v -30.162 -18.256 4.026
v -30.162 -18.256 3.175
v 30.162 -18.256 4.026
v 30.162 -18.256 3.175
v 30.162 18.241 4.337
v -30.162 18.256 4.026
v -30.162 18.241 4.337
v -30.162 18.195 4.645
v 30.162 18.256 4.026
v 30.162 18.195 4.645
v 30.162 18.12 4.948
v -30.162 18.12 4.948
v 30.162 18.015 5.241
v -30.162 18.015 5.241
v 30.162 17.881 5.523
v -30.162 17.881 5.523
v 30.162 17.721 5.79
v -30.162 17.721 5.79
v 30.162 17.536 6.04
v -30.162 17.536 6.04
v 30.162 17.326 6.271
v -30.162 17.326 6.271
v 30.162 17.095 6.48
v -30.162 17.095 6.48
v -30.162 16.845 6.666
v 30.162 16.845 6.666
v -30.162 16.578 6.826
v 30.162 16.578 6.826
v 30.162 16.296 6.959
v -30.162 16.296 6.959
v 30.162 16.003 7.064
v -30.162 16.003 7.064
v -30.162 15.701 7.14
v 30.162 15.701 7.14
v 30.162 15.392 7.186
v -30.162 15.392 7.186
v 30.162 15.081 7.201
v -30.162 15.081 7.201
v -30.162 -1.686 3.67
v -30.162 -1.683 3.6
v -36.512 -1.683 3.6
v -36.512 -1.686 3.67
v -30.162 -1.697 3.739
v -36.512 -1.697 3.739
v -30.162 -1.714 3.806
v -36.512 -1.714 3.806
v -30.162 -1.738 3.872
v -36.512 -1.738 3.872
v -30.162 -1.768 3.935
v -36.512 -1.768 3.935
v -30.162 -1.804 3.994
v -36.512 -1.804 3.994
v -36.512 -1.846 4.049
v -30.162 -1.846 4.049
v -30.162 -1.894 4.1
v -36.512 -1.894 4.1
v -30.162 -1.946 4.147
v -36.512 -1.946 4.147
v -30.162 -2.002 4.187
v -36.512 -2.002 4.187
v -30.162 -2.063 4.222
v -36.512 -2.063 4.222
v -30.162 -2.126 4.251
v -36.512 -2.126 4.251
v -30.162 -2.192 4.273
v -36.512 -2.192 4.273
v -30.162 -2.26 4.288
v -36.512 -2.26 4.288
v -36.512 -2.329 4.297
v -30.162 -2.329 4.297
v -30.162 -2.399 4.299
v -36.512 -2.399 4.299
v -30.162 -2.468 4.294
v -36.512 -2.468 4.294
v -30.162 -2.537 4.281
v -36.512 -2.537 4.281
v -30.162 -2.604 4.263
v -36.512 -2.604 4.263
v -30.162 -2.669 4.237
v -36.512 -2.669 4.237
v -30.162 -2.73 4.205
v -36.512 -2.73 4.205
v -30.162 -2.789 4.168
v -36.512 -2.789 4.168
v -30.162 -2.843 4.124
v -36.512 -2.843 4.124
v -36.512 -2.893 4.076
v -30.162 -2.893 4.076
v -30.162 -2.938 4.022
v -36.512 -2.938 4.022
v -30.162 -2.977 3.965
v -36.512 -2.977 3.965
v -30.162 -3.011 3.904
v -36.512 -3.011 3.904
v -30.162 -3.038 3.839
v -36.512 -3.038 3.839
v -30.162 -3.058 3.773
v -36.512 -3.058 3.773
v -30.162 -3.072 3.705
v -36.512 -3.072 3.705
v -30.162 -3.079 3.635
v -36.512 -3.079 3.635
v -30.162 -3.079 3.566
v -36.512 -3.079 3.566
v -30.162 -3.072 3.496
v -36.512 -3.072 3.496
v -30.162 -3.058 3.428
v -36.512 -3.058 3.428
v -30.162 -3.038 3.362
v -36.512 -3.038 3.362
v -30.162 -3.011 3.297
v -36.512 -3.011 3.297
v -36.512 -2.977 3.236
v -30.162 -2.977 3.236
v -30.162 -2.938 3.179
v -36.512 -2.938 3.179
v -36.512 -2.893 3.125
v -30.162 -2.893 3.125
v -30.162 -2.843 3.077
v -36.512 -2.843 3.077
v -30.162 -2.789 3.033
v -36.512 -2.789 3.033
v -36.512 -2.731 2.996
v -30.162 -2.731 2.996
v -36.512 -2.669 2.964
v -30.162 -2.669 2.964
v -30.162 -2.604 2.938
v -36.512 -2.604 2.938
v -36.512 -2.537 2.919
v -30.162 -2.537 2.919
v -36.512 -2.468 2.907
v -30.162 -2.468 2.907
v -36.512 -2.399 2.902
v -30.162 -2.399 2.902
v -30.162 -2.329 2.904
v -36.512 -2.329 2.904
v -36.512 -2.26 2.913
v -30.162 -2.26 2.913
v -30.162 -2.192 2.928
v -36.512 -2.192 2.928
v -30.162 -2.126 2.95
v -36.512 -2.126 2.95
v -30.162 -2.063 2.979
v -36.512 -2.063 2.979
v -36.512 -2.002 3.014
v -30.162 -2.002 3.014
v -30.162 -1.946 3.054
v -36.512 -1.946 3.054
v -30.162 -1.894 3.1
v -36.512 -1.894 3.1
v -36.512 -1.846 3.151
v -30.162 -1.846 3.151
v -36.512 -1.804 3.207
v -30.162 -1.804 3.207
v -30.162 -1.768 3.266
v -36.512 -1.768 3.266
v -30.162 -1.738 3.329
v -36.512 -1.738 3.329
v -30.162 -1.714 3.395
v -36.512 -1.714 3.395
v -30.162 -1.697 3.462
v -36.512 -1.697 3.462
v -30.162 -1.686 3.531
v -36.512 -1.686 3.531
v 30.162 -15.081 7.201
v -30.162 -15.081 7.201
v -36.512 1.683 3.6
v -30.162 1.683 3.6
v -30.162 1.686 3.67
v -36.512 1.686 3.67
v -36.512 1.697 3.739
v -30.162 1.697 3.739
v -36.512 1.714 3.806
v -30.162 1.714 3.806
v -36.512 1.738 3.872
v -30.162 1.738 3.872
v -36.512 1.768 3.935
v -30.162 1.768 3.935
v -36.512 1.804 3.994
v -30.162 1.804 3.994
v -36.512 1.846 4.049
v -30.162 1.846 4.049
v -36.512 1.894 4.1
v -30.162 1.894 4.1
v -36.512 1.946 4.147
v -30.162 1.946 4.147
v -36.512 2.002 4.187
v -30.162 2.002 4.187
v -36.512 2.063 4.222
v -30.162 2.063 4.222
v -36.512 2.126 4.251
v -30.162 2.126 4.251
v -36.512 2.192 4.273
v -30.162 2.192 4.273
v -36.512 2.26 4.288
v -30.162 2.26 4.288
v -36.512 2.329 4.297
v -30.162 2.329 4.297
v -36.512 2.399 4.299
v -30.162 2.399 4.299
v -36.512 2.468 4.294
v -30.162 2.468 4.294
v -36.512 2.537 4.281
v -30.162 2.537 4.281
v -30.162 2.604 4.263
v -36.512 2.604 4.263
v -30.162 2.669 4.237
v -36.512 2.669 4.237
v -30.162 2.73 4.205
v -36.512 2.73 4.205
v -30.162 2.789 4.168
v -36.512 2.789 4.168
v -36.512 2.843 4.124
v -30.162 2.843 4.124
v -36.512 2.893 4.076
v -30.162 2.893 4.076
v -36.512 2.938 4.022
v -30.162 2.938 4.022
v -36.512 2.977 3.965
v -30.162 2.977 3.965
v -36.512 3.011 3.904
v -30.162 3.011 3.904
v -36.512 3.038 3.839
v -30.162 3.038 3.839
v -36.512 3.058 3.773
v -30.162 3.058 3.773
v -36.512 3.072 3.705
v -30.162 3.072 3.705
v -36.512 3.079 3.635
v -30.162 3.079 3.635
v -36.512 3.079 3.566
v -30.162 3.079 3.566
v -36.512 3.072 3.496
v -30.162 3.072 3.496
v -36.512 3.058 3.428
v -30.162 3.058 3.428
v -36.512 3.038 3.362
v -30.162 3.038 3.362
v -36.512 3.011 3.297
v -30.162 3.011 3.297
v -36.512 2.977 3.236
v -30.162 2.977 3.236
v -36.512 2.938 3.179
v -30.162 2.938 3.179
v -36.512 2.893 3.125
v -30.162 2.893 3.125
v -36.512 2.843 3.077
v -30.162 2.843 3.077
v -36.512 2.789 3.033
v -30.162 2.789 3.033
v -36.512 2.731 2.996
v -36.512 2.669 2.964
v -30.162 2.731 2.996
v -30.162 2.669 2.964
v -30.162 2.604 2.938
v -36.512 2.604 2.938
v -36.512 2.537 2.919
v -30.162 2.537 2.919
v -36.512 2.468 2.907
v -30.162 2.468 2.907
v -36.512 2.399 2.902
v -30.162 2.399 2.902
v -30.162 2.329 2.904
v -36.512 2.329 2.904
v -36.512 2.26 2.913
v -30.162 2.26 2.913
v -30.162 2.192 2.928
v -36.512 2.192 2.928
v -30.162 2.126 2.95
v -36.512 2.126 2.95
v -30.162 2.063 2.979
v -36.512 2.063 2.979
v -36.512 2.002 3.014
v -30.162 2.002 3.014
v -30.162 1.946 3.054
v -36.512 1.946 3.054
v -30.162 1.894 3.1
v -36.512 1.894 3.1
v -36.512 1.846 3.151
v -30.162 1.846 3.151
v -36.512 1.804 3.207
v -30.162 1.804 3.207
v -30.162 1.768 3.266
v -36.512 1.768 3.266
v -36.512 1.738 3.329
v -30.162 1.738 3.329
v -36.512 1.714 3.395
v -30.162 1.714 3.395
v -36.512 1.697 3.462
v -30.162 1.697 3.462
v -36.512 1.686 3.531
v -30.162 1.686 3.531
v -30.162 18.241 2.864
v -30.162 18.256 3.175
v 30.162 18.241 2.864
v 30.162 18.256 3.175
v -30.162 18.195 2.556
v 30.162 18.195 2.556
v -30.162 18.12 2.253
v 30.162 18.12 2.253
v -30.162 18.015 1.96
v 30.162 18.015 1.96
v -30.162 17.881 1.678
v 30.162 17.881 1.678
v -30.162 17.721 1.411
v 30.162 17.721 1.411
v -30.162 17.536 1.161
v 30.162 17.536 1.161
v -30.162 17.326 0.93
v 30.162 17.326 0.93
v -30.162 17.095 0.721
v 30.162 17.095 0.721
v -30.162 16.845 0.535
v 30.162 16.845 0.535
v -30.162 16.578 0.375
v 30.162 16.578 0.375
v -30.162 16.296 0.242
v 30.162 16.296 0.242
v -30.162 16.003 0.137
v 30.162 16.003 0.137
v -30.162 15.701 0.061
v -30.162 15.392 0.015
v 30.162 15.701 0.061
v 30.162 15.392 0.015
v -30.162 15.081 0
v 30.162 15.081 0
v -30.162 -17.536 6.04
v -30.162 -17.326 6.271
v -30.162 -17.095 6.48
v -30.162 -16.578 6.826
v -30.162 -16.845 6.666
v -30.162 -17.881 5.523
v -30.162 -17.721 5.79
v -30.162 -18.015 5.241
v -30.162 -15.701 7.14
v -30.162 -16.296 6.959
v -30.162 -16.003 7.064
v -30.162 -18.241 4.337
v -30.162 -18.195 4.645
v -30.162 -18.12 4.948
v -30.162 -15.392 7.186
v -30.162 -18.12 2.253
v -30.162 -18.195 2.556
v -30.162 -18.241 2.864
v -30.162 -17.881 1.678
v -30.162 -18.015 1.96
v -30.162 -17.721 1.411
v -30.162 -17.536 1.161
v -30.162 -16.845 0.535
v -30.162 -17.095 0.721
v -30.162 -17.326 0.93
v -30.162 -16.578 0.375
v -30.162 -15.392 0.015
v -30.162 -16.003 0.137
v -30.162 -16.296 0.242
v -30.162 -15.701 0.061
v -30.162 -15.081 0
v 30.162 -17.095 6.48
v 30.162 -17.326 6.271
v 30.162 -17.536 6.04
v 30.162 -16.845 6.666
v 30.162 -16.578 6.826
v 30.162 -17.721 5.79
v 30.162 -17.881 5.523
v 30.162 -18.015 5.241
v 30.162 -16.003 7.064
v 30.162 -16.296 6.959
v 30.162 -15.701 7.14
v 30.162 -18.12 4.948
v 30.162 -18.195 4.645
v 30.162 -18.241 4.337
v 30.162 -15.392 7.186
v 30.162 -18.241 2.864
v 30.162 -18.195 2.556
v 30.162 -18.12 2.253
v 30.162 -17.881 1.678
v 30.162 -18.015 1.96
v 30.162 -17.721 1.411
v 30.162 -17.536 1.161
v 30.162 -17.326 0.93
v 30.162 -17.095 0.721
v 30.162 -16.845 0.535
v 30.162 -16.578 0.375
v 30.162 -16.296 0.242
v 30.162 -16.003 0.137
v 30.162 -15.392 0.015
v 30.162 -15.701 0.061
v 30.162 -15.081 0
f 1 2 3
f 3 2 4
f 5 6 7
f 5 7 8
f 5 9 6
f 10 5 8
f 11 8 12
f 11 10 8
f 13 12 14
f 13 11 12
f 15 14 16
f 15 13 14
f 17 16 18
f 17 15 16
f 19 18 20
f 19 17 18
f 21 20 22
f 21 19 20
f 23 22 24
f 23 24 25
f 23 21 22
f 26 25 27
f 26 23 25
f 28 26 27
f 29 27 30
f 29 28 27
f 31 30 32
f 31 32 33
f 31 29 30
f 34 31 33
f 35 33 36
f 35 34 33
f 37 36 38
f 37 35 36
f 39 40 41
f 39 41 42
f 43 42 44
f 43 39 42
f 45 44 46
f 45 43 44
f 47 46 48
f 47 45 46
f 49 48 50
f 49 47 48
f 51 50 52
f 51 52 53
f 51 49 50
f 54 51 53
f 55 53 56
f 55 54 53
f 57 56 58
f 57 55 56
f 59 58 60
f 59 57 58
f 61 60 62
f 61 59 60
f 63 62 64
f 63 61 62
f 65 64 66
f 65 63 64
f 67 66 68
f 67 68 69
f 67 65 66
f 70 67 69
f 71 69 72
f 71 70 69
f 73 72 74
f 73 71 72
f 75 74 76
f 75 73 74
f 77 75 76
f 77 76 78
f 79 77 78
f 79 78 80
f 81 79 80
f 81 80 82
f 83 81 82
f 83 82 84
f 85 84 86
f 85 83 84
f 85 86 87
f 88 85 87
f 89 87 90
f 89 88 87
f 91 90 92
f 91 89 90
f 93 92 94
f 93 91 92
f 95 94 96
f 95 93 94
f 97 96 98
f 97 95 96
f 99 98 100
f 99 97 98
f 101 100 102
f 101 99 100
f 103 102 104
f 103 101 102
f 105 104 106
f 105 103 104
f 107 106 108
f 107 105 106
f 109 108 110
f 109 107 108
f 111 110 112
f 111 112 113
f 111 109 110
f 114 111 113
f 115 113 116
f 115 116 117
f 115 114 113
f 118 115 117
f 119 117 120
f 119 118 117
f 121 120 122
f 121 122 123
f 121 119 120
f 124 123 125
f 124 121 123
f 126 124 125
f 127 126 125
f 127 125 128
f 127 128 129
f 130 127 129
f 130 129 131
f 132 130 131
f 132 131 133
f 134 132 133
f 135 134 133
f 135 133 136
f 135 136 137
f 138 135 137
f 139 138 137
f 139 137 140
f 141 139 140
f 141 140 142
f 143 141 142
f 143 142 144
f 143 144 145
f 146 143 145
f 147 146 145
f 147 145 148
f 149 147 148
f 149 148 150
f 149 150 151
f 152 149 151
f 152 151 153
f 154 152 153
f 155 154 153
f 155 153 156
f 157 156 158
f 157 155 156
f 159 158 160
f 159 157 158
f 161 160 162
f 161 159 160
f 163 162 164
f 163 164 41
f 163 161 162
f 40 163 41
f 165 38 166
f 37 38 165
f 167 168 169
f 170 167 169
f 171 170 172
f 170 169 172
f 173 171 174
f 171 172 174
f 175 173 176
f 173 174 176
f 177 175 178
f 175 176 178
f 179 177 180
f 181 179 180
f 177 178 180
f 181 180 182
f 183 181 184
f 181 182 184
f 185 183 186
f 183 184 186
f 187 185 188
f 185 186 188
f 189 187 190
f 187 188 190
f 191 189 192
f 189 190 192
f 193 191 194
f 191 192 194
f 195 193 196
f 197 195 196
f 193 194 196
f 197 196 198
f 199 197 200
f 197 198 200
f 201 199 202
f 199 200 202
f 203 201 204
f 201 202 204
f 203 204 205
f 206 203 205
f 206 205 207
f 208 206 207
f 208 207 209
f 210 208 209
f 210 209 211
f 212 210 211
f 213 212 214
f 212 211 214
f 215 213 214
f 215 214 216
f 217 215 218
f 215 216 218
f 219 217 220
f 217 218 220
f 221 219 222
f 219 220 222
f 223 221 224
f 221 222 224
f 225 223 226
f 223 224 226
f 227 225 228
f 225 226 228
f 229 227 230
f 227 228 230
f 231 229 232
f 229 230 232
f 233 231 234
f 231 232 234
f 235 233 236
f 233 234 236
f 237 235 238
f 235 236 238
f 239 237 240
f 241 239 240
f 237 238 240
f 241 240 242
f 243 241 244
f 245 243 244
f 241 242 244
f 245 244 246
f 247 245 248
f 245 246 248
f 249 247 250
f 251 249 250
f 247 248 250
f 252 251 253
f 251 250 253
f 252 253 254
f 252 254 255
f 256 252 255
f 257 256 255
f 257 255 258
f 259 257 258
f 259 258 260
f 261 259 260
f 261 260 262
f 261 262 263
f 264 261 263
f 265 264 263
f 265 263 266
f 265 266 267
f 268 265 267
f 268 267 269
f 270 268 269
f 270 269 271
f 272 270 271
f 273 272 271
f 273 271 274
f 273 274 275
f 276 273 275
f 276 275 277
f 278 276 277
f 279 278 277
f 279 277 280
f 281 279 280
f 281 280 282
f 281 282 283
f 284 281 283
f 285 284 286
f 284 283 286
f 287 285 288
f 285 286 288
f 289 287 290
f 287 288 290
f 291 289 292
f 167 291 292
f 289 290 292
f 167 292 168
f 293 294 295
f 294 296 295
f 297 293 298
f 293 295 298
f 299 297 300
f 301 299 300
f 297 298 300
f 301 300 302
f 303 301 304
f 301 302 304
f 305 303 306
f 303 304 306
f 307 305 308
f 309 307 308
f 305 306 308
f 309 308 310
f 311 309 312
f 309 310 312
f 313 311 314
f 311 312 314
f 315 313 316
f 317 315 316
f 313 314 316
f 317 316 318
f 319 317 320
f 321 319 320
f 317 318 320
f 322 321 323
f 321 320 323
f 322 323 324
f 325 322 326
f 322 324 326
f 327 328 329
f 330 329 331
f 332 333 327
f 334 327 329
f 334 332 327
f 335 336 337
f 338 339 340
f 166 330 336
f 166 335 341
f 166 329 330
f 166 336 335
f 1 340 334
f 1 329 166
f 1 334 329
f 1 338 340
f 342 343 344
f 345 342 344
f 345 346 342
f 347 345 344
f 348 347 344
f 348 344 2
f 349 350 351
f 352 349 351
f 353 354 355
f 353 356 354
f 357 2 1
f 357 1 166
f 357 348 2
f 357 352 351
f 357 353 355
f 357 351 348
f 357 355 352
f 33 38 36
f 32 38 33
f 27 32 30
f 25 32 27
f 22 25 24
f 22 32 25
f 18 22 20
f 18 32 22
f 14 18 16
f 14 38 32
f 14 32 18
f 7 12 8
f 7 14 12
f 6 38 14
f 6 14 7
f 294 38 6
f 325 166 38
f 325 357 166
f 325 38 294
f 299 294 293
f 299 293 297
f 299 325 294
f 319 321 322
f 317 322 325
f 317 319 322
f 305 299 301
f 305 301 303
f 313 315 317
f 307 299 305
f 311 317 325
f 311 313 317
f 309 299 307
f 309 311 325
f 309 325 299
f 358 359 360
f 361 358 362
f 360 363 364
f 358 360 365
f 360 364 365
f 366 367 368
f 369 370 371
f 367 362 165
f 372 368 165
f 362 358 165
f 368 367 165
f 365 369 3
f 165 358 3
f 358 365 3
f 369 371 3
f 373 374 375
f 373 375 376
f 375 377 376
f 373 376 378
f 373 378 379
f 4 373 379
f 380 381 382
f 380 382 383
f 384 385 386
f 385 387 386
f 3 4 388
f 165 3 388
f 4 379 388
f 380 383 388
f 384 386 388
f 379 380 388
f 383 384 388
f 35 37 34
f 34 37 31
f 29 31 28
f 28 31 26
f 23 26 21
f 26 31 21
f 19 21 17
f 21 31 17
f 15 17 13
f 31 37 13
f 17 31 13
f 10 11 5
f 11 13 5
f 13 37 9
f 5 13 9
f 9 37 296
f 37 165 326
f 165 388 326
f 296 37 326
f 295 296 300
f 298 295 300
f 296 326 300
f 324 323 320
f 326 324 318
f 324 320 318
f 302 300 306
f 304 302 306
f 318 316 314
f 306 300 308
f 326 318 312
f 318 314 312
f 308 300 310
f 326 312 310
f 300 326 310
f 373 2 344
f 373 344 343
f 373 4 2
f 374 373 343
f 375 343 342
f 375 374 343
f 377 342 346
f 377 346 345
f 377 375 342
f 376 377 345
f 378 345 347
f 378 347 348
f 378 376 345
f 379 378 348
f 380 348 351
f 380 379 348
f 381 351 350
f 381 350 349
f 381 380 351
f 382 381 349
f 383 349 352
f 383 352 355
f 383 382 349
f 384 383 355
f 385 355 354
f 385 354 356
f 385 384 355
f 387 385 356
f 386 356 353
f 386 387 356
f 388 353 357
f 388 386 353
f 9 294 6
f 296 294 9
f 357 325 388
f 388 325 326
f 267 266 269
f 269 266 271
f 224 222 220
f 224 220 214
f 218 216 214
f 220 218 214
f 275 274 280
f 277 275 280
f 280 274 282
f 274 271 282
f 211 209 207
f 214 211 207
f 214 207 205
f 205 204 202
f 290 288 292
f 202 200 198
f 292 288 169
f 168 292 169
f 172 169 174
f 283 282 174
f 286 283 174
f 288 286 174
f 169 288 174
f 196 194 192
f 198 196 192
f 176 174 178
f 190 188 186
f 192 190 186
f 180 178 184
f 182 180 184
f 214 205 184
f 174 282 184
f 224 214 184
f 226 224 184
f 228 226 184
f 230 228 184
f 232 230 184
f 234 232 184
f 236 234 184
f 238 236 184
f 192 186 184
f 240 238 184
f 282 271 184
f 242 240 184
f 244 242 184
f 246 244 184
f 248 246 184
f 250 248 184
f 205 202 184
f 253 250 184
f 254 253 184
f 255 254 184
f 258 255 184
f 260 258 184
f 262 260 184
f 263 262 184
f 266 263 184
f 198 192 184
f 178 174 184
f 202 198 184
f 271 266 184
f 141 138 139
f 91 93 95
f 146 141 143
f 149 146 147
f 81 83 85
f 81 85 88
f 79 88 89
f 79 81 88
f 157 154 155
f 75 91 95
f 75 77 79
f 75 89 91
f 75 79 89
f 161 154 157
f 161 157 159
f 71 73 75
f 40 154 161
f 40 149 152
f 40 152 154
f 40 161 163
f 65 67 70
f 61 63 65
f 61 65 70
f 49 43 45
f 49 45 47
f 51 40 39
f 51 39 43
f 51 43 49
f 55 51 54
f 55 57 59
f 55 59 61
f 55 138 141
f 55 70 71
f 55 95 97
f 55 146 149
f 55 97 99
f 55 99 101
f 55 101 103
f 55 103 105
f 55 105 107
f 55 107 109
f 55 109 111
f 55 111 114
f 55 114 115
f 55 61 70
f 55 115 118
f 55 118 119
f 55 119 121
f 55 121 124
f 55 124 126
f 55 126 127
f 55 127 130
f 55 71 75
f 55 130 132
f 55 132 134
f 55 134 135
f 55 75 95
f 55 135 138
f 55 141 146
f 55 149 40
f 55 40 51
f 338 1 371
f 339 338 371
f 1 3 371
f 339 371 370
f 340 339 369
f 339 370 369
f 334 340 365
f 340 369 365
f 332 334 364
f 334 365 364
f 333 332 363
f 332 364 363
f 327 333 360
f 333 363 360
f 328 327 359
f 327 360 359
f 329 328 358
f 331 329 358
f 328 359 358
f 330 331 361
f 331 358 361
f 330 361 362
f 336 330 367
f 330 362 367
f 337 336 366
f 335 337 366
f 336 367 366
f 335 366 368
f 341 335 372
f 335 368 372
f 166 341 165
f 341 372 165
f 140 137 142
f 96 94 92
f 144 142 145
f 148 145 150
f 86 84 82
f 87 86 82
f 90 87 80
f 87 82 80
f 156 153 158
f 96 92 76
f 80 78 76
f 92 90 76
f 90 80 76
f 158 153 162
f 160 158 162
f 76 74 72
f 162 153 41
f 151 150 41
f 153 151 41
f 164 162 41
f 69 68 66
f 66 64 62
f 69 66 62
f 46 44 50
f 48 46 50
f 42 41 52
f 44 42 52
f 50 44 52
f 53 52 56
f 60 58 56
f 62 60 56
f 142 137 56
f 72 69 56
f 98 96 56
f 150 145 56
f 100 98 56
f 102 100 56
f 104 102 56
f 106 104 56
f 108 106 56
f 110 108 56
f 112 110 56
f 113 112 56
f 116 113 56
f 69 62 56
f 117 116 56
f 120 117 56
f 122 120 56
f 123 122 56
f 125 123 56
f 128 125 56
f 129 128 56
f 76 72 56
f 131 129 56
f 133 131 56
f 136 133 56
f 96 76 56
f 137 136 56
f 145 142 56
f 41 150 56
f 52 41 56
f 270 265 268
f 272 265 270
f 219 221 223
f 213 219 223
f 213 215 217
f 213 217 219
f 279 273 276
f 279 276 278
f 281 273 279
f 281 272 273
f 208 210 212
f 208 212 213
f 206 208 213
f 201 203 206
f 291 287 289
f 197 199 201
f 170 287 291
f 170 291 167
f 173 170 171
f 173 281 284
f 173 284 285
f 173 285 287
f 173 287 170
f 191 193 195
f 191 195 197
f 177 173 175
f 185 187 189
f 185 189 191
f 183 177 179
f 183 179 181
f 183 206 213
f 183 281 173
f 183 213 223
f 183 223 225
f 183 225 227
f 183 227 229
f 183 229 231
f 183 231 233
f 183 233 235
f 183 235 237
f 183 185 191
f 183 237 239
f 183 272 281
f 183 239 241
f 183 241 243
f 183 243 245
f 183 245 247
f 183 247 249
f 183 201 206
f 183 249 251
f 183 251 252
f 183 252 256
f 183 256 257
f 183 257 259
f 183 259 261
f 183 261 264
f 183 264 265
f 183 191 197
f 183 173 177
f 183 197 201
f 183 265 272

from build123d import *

# Parameters (mm, degrees)
F0_W     = 60.325
F0_H     = 36.5125
F1_DEPTH = 7.2009
F2_R     = 3.175
F3_R     = 0.6985
F4_DEPTH = 6.35


with BuildPart() as f1:
    # F0 (on Top) → F1 (new body)
    with BuildSketch(Plane.XY):
        Rectangle(F0_W, F0_H)
    extrude(amount=F1_DEPTH)

    # F2
    f2_edges = [f1.edges().sort_by_distance(p)[0] for p in [
        (0, -18.25625, 7.2009),
        (0, -18.25625, 0),
        (0, 18.25625, 7.2009),
        (0, 18.25625, 0),
    ]]
    fillet(f2_edges, radius=F2_R)


with BuildPart() as f4:
    # F3 (on face) → F4 (new body)
    with BuildSketch(Plane(origin=(-30.1625, 0, 0), x_dir=(0, -1, 0), z_dir=(-1, 0, 0))):
        with Locations((-2.38125, 3.60045)):
            Circle(F3_R)
    extrude(amount=F4_DEPTH)


with BuildPart() as f5_1:
    # F5: instance of F4
    add(f4.part.mirror(Plane.XZ))


solid = Compound([f1.part, f4.part, f5_1.part])
